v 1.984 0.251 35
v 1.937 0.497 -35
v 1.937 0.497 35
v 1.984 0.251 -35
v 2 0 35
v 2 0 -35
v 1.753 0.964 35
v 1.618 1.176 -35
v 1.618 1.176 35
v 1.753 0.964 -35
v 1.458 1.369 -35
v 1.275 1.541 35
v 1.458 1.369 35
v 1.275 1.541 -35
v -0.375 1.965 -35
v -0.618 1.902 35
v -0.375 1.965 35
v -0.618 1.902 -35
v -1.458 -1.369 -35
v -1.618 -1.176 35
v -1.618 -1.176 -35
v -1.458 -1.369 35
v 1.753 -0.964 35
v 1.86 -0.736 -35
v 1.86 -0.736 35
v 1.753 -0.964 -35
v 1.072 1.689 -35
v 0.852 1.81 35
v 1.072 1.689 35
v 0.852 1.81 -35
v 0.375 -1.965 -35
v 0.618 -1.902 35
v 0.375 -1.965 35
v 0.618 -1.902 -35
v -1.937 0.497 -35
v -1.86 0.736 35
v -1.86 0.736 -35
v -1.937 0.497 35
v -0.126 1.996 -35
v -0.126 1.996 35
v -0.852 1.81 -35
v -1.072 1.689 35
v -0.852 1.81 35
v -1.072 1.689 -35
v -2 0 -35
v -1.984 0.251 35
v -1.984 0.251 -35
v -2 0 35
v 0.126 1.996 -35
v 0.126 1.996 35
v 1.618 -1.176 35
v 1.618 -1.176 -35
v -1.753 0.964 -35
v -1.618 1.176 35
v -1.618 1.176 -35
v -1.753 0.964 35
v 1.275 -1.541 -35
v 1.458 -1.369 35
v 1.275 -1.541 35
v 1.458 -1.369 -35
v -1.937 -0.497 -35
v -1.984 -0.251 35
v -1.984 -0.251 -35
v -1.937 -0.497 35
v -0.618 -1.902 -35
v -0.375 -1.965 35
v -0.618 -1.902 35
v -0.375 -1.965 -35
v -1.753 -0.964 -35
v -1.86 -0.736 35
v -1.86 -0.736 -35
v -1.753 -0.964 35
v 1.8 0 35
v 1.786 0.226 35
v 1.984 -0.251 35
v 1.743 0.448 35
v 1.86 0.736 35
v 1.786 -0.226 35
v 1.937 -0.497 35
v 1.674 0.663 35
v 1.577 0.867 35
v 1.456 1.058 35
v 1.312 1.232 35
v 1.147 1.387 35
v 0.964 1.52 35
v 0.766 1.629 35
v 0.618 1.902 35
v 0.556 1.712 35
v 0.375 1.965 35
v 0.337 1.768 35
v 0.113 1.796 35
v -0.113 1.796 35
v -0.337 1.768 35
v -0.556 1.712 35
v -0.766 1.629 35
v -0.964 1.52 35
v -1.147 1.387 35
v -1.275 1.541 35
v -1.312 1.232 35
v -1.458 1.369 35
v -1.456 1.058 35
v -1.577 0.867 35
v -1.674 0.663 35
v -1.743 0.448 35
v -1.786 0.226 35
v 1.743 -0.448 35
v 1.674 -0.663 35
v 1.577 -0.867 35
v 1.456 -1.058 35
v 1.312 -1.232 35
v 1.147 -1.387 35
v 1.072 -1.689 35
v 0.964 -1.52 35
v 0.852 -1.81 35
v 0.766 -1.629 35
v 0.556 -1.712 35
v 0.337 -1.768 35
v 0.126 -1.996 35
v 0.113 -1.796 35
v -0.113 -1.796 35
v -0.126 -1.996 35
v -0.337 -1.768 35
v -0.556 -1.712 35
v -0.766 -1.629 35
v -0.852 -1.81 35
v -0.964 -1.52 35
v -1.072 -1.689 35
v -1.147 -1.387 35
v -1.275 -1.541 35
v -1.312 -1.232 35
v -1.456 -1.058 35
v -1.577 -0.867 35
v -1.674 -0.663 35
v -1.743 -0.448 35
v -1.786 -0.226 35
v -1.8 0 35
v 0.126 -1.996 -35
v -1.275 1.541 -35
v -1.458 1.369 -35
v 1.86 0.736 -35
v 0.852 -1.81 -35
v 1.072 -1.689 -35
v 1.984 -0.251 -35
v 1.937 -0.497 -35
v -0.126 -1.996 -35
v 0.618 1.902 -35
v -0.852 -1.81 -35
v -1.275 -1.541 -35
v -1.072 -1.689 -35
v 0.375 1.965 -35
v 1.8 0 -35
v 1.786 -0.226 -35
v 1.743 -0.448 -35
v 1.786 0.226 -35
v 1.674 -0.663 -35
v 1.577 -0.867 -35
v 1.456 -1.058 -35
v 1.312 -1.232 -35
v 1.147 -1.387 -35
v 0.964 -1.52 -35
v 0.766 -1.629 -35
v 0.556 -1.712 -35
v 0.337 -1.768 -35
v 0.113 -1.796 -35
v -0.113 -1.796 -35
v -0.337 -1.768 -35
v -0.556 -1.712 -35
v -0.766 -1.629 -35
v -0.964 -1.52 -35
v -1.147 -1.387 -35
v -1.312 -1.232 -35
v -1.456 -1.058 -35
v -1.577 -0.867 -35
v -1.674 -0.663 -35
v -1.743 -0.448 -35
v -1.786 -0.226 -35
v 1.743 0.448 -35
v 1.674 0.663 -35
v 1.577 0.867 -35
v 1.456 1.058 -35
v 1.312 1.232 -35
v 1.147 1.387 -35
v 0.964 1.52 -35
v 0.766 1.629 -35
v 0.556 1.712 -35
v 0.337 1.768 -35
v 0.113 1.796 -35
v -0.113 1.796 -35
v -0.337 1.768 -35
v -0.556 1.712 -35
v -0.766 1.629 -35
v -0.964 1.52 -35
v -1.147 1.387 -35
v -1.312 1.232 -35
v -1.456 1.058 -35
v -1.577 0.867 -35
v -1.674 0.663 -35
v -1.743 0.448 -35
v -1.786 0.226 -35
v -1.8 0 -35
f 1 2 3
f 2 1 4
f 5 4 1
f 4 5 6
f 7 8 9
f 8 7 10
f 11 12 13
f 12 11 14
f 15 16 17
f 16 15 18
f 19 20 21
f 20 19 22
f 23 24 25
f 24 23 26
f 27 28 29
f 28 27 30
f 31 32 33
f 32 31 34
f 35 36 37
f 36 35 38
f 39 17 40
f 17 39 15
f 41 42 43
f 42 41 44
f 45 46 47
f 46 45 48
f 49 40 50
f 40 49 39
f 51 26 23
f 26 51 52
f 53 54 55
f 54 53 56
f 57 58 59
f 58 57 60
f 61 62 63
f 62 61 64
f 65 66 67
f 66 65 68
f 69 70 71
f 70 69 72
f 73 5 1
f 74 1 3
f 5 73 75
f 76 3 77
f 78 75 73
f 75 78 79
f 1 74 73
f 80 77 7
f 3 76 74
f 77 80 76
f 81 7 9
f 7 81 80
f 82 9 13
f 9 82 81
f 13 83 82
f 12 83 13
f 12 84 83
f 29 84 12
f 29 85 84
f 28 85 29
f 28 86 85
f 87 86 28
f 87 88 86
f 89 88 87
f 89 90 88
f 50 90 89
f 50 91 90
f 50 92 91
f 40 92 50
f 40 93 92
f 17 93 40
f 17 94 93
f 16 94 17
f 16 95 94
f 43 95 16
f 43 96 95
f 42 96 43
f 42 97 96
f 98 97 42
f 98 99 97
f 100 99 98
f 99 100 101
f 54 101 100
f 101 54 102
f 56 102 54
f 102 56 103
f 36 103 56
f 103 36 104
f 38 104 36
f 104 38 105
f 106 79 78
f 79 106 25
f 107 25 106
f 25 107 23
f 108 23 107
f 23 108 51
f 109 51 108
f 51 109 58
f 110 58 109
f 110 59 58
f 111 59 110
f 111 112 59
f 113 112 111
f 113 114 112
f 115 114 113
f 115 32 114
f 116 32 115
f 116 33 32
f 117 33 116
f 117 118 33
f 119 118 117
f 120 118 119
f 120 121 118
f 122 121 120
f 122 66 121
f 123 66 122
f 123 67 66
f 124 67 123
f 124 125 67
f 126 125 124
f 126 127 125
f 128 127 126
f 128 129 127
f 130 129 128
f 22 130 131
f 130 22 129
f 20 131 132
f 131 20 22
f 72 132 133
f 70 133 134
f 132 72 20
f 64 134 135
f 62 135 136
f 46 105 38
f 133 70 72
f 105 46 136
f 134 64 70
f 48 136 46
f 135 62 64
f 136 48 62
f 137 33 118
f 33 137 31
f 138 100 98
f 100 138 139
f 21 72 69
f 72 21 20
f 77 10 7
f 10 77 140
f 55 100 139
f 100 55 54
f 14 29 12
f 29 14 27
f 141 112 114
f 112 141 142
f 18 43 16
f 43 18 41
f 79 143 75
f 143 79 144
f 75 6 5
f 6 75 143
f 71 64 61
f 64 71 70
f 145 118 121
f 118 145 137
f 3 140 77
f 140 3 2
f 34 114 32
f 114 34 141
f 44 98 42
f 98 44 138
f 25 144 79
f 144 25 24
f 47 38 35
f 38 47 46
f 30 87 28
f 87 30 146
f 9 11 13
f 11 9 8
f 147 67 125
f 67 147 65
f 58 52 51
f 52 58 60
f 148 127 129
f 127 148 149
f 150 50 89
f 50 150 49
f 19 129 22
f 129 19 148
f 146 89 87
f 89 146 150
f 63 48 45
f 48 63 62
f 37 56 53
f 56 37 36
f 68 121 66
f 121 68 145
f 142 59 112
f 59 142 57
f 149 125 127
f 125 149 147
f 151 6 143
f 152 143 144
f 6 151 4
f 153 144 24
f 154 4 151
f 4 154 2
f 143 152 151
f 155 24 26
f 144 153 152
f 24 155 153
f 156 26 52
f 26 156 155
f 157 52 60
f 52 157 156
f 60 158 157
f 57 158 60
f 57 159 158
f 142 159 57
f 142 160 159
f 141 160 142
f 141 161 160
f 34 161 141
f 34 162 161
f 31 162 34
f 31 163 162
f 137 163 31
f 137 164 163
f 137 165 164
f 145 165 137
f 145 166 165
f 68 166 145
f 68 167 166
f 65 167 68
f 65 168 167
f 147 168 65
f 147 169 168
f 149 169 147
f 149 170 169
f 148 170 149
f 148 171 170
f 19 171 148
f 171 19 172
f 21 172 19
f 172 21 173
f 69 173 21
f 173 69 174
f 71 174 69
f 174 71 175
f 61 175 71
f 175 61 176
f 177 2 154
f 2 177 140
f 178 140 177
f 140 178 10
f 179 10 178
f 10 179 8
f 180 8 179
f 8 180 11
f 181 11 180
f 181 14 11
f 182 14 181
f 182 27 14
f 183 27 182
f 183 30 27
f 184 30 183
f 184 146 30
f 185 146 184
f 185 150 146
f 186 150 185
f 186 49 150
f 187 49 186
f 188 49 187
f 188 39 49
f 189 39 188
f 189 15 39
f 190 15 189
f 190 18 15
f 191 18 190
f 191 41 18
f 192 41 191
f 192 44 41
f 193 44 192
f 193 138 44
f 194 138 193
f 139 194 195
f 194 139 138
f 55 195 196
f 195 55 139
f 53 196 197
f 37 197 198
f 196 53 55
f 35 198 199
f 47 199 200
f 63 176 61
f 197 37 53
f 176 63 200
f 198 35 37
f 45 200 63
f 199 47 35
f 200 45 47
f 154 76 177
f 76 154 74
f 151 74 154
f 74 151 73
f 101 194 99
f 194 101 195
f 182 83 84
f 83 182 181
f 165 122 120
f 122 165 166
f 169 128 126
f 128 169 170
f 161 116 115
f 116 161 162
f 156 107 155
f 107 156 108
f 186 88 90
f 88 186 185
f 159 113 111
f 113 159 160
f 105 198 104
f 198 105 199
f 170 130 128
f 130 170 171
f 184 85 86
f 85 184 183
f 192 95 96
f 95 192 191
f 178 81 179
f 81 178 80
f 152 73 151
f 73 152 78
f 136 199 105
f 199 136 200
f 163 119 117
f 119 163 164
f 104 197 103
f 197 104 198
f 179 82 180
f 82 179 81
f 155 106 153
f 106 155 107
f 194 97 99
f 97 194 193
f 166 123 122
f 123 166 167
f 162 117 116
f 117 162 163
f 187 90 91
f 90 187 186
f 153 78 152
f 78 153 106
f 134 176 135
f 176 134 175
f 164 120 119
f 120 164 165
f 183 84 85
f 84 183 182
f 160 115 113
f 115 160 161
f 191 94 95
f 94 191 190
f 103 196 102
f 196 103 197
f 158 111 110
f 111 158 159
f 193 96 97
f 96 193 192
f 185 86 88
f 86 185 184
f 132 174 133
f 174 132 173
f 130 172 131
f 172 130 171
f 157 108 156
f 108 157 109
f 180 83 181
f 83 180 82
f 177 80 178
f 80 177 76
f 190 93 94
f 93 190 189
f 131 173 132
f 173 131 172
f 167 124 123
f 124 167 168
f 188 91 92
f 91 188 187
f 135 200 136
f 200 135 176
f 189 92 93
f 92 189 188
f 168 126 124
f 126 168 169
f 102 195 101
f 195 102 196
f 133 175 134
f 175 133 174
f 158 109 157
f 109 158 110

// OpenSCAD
$fn = 50;


difference() {
	union() {
		translate(v = [0, 0, -35.0000000000]) {
			cylinder(h = 70, r = 2.0000000000);
		}
	}
	union() {
		#translate(v = [0, 0, -100.0000000000]) {
			cylinder(h = 200, r = 1.8000000000);
		}
	}
}
